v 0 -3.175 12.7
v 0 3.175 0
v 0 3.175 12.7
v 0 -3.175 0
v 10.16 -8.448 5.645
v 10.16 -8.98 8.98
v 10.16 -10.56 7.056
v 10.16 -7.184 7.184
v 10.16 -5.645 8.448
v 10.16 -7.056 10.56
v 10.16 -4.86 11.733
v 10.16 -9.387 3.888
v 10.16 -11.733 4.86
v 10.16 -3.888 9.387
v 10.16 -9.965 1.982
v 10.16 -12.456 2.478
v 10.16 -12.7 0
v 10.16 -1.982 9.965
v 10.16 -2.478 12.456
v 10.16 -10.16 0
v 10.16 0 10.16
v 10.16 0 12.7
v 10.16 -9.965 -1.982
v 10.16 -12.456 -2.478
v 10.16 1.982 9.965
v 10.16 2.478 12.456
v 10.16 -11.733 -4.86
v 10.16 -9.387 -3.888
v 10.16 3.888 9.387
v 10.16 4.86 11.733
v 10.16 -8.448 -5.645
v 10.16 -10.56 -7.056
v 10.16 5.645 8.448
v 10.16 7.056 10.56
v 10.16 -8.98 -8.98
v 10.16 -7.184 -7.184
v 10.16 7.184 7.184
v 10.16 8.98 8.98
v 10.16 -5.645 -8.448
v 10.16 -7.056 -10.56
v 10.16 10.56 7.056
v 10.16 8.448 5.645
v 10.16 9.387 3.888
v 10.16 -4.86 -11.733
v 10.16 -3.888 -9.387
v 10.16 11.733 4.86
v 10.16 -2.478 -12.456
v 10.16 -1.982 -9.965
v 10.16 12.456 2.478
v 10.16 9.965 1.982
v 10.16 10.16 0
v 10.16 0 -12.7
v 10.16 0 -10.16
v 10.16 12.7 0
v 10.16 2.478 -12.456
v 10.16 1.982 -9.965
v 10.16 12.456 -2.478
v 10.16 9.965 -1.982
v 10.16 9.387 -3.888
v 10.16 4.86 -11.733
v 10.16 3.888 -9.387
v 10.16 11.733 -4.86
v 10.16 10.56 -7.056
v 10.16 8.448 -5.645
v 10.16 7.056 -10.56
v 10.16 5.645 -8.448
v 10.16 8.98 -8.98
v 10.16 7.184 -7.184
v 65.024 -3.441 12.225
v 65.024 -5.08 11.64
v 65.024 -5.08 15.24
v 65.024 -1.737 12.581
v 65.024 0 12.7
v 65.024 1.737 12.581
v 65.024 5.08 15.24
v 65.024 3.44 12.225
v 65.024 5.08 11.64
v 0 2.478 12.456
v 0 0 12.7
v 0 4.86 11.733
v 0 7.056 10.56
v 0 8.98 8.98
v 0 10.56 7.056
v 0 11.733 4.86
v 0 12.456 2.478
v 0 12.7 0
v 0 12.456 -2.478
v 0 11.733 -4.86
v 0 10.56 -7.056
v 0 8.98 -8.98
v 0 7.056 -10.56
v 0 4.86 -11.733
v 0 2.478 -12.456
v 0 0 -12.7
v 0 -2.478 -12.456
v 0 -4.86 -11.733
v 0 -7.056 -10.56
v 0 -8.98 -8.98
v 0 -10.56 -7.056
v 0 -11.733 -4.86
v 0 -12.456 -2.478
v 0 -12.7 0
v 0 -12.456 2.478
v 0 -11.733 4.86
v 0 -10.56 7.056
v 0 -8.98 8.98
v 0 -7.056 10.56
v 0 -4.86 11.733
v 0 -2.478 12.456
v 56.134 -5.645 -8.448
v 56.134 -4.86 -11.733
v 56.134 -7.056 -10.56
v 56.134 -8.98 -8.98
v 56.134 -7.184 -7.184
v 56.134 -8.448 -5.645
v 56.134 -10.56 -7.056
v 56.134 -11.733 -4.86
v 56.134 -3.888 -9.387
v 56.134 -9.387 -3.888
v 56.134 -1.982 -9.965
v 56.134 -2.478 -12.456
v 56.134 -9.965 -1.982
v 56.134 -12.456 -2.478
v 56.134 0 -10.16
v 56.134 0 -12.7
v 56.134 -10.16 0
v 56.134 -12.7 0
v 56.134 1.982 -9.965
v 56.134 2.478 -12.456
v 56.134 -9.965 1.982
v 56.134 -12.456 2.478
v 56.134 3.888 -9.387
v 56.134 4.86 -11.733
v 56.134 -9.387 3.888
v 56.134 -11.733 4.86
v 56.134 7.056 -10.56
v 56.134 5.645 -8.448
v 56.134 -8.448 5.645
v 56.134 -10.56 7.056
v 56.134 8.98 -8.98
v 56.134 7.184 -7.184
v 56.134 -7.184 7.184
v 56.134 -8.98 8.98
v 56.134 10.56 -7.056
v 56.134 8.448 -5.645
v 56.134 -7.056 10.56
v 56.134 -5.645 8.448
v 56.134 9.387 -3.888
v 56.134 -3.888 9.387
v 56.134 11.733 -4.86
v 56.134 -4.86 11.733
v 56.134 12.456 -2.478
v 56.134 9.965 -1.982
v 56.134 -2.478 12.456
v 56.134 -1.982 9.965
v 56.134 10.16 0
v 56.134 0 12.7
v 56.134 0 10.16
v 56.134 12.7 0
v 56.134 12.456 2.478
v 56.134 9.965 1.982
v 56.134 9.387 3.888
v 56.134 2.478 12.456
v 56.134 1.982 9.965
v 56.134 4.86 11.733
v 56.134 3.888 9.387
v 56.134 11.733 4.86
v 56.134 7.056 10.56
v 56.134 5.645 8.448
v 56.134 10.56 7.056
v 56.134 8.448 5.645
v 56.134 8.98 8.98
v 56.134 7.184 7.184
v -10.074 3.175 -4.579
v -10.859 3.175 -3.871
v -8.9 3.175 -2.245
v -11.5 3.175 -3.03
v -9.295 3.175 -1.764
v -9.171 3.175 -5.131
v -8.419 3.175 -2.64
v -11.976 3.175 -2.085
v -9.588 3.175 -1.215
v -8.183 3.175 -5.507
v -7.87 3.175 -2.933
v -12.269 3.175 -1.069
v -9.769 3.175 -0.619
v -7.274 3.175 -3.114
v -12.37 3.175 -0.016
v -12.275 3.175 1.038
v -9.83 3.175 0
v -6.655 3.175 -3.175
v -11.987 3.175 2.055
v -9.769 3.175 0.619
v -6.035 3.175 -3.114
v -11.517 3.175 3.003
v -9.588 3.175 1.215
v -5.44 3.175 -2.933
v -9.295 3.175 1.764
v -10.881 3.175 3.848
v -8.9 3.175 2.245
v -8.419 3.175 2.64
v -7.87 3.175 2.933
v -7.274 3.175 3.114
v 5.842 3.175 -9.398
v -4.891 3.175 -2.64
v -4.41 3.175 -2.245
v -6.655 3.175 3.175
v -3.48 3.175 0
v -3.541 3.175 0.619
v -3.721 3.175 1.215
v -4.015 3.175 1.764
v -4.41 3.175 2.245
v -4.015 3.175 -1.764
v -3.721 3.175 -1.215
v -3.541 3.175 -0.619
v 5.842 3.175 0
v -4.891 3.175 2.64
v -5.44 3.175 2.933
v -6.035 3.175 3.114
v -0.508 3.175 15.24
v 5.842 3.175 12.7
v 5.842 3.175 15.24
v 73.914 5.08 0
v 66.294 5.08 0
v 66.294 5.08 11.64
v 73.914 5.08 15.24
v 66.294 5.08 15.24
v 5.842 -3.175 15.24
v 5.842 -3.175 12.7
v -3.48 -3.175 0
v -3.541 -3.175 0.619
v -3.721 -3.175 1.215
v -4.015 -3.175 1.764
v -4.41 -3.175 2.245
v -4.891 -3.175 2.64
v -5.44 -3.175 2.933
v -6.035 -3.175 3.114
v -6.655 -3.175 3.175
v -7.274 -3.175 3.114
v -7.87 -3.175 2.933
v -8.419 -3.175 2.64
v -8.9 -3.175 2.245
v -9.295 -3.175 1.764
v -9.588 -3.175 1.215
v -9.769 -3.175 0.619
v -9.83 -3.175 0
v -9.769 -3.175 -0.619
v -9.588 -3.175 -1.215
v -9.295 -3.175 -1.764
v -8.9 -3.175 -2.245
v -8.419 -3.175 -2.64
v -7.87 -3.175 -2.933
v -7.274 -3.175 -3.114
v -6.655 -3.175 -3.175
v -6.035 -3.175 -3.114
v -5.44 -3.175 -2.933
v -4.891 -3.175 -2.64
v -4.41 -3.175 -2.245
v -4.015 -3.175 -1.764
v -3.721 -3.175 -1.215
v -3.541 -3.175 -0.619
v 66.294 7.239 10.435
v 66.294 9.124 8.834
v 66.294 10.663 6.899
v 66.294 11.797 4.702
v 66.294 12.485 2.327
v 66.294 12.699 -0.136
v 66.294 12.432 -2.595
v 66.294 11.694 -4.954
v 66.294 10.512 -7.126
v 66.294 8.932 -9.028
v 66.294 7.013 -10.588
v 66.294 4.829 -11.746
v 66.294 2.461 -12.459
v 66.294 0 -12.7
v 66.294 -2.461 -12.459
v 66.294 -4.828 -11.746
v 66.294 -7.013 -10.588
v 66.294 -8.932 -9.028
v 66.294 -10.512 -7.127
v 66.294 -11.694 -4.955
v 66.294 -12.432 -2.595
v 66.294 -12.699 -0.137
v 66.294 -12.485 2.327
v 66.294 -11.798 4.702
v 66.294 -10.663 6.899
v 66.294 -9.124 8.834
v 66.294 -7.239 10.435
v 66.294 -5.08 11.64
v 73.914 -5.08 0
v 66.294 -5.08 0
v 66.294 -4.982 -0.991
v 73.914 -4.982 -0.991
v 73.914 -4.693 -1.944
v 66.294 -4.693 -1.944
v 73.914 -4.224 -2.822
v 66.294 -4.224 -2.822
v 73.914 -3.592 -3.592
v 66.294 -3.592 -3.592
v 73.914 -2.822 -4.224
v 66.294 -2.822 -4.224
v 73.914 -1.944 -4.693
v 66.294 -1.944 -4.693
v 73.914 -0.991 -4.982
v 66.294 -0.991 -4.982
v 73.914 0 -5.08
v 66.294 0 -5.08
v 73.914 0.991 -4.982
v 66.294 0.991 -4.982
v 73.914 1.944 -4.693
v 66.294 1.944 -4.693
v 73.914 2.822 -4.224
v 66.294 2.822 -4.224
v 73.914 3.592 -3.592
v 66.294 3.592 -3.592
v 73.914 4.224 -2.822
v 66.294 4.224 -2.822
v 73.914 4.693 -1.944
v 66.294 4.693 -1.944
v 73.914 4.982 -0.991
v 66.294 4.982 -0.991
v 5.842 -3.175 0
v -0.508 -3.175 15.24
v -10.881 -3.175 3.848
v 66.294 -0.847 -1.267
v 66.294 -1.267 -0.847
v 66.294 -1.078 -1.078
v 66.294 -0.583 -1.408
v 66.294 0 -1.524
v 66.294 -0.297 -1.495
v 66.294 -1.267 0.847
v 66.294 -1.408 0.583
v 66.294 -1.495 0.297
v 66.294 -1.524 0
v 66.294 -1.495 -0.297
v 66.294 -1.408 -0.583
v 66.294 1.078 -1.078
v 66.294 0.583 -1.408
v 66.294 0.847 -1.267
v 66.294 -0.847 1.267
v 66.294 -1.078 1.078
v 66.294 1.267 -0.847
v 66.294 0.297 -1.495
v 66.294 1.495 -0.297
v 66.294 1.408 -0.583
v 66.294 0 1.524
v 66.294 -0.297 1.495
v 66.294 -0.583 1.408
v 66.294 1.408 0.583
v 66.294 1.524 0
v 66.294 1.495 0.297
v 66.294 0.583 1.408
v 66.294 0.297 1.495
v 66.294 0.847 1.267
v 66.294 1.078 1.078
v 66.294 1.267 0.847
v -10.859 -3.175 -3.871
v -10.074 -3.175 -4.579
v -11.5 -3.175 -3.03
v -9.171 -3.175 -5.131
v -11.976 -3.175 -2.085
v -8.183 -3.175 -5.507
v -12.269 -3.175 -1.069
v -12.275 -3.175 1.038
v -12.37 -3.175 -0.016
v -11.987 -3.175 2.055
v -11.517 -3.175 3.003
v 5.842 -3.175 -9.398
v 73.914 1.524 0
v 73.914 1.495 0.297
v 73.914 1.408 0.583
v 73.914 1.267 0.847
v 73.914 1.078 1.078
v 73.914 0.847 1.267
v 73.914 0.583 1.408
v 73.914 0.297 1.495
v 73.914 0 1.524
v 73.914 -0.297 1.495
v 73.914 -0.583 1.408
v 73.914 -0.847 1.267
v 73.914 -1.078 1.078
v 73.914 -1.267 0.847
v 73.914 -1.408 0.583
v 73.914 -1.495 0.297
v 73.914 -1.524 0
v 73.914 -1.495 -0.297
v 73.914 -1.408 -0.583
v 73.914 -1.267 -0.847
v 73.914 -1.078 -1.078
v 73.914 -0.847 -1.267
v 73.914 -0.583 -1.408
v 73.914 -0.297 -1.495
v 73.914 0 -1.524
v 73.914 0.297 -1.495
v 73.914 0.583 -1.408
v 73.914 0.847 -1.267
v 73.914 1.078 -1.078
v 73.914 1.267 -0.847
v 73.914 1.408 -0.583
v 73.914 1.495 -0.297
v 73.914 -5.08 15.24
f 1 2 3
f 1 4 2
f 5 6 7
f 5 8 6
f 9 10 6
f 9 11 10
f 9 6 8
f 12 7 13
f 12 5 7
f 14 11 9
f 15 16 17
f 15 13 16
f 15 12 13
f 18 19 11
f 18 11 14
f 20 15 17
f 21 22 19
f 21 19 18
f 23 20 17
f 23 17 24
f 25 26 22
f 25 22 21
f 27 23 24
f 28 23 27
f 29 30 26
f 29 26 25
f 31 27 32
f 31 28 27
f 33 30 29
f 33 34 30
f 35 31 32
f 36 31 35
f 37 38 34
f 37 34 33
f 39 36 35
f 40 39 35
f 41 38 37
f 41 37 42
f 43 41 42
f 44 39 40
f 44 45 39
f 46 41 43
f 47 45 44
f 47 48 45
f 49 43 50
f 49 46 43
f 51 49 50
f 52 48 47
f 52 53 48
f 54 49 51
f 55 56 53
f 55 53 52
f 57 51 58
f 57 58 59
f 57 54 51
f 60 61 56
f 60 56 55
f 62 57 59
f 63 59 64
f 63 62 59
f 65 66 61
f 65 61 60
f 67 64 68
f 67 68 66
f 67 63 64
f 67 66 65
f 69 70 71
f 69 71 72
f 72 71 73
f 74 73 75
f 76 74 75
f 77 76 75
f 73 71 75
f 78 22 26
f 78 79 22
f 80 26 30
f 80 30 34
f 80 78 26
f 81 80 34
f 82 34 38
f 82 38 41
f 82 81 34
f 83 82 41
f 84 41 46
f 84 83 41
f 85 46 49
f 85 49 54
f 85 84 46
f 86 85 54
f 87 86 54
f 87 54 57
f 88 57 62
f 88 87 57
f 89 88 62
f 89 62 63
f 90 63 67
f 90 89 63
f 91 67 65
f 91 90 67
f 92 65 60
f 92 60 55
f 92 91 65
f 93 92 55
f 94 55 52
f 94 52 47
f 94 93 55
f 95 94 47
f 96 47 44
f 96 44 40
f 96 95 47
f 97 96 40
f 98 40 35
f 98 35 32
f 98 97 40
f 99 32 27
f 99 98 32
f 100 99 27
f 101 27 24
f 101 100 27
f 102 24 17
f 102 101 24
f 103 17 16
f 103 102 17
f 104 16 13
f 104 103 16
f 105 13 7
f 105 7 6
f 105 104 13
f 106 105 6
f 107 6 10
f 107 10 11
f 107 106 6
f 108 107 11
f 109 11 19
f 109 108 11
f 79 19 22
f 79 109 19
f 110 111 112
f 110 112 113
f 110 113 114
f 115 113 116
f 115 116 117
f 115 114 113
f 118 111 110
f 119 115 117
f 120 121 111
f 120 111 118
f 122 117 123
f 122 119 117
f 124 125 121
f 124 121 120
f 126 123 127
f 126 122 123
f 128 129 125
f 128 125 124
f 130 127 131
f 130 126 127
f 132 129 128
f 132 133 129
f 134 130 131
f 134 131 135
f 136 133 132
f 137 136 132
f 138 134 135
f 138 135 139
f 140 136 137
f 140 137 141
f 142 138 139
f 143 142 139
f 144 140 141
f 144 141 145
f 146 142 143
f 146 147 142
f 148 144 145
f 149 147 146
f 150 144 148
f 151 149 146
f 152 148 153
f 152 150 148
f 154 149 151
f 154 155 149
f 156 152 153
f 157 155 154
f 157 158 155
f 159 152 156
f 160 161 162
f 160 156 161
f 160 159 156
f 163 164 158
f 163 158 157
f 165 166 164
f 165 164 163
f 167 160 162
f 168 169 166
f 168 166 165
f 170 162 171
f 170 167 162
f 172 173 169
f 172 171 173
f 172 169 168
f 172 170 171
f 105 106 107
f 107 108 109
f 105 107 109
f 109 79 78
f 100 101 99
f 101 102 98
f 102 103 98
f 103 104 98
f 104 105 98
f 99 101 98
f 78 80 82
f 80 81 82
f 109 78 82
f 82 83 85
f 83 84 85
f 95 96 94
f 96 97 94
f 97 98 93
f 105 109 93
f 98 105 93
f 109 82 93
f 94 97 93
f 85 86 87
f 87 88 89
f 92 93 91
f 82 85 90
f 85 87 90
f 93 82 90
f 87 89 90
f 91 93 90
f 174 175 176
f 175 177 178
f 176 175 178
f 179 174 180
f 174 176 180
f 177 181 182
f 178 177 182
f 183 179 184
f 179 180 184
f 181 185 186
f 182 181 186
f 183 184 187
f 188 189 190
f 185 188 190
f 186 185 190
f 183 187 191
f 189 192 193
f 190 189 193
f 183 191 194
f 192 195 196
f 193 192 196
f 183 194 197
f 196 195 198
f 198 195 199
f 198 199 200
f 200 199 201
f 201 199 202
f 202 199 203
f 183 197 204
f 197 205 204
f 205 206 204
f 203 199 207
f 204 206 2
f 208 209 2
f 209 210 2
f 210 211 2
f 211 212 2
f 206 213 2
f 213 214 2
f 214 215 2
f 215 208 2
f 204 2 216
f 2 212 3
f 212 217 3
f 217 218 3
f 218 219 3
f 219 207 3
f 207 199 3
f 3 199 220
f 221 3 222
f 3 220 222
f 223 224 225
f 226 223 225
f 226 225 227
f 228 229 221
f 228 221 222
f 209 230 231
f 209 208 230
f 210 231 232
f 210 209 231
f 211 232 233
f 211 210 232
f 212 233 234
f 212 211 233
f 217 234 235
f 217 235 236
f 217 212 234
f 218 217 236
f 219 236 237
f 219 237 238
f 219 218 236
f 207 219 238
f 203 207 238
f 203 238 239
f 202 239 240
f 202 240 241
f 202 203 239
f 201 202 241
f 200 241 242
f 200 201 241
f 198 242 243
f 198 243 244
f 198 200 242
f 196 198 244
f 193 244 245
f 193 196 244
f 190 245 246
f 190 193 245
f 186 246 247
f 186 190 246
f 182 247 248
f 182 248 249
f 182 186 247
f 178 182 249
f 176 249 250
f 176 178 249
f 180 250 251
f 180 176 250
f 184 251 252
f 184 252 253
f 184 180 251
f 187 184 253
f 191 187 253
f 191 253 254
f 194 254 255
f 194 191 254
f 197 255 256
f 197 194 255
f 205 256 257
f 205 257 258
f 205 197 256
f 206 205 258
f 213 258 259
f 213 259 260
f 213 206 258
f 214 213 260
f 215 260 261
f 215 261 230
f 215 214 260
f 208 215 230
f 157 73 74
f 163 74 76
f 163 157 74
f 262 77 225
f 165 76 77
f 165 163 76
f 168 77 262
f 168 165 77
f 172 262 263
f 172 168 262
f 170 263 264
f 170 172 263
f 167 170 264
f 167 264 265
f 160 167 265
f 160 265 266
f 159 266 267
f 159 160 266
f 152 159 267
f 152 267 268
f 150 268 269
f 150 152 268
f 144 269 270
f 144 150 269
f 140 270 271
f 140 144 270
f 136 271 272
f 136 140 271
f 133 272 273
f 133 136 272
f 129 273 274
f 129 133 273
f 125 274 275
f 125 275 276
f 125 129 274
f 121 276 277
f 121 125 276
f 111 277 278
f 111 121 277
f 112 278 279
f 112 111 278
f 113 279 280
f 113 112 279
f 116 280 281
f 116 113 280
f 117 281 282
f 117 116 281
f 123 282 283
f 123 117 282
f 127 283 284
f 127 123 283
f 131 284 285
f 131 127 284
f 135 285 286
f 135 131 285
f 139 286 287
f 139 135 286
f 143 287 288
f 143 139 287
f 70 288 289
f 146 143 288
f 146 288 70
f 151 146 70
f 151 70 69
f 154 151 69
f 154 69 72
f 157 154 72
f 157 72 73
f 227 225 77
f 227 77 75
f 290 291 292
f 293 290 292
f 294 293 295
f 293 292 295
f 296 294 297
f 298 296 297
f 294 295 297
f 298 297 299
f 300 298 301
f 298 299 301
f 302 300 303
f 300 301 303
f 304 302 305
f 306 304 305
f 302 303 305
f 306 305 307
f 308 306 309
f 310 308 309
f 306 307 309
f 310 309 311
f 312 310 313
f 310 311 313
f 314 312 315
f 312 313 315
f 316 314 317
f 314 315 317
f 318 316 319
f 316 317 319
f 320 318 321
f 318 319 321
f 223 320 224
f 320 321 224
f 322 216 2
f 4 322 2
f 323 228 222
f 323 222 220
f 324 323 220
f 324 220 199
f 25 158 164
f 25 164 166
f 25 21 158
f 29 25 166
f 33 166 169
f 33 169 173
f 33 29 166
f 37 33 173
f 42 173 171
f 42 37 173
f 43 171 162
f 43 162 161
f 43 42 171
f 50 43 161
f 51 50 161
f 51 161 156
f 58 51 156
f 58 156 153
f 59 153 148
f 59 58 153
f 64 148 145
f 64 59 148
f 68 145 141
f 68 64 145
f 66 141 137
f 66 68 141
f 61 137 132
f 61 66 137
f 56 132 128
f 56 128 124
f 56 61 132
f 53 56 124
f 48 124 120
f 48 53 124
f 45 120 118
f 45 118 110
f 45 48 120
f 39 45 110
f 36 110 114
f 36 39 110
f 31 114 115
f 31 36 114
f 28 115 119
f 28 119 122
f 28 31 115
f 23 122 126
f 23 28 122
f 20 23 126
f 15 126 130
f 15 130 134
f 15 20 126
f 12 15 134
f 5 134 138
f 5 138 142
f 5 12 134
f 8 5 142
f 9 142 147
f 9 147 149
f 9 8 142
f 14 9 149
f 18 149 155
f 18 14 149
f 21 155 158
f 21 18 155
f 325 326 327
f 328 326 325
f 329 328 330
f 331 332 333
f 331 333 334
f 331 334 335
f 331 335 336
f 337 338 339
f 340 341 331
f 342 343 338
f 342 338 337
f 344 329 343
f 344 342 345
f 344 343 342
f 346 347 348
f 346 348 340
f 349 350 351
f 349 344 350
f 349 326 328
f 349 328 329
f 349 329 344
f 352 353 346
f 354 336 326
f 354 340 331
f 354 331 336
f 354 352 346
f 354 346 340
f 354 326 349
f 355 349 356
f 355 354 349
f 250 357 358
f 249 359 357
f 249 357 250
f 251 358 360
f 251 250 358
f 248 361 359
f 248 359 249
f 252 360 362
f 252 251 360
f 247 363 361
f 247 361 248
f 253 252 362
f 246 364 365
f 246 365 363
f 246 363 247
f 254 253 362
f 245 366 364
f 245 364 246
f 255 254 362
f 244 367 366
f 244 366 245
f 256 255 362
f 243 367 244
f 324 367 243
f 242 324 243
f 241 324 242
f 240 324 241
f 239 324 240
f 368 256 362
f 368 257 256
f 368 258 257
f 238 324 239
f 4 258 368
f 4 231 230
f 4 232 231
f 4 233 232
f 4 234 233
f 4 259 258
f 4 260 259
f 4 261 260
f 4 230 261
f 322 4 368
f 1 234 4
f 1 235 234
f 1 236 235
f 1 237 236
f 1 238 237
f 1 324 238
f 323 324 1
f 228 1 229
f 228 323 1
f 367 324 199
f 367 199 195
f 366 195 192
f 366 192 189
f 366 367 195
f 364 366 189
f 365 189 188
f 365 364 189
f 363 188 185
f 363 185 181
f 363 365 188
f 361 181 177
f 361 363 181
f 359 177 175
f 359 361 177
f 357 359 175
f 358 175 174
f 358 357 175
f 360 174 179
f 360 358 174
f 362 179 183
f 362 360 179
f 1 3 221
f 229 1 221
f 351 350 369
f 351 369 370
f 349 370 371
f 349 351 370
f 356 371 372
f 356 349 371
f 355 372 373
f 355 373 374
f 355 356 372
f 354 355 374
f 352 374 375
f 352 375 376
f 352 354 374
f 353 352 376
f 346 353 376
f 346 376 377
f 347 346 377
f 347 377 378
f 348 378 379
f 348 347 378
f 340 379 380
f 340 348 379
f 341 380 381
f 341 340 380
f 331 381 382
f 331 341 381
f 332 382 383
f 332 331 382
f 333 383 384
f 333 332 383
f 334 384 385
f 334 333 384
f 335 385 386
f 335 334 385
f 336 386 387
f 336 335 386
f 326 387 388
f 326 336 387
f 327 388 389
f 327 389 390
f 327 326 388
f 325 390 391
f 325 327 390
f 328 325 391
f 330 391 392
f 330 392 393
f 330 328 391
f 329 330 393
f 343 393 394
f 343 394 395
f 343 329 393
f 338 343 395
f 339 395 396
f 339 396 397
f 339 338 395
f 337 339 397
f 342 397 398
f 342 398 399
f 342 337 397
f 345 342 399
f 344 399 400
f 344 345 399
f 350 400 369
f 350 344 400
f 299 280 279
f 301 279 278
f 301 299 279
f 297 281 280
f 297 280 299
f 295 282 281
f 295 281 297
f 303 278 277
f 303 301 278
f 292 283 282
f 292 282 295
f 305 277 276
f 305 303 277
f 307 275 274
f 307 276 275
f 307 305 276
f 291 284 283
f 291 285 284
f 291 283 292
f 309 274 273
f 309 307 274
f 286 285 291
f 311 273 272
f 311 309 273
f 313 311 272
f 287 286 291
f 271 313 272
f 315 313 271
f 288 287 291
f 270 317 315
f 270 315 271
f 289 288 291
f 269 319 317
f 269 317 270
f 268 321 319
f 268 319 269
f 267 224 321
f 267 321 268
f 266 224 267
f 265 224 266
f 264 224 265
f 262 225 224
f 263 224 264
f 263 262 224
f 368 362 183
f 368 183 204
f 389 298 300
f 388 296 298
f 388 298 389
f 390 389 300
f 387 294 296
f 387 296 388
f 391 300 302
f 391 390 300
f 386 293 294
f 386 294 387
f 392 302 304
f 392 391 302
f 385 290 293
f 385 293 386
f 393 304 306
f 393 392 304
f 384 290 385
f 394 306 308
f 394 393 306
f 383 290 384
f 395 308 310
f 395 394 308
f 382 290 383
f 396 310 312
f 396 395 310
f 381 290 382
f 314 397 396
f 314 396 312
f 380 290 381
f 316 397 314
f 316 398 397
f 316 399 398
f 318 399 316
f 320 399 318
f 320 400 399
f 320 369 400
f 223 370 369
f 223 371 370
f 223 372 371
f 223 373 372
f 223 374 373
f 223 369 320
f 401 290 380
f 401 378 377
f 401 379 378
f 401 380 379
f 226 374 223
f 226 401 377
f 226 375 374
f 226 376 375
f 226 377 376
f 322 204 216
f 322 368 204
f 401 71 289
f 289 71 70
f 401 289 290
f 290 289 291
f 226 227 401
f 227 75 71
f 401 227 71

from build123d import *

# Parameters (mm, degrees)
F0_W     = 5.842
F0_H     = 12.7
F0_R     = 3.175
F2_DEPTH = 3.175
F4_DEPTH = 1.27
F3_R     = 1.524
F5_DEPTH = 7.62


with BuildPart() as f1:
    # F0 (on Front) → F1 (revolve)
    with BuildSketch(Plane.XZ):
        Polygon((5.842, 12.7), (5.842, 0), (66.294, 0), (66.294, 12.7), (56.134, 12.7), (56.134, 10.16), (10.16, 10.16), (10.16, 12.7), align=None)
        with Locations((2.921, 6.35)):
            Rectangle(F0_W, F0_H)
    revolve(axis=Axis((33.147, 0, 0), (-1, 0, 0)))

    # F3 (on face) → F4 (join)
    with BuildSketch(Plane.YZ.offset(66.294)):
        with BuildLine():
            ThreePointArc((-5.08, 11.639742), (-0.000107, 12.7), (5.079804, 11.639828))
            Line((5.079804, 11.639828), (5.079743, 15.24))
            Line((5.079743, 15.24), (-5.08, 15.24))
            Line((-5.08, 15.24), (-5.08, 11.639742))
        make_face()
    extrude(amount=-F4_DEPTH)

    # F3 (on face) → F5 (join)
    with BuildSketch(Plane.YZ.offset(66.294)):
        with BuildLine():
            ThreePointArc((-5.08, 0), (0, -5.08), (5.08, 0))
            ThreePointArc((5.08, 0), (0, 5.08), (-5.08, 0))
        make_face()
        Circle(F3_R, mode=Mode.SUBTRACT)
        with BuildLine():
            ThreePointArc((-5.08, 0), (0, 5.08), (5.08, 0))
            Line((5.08, 0), (5.079743, 15.24))
            Line((5.079743, 15.24), (-5.08, 15.24))
            Line((-5.08, 15.24), (-5.08, 0))
        make_face()
    extrude(amount=F5_DEPTH)


with BuildPart() as f2:
    # F0 (on Front) → F2 (new body, symmetric)
    with BuildSketch(Plane.XZ):
        with BuildLine():
            ThreePointArc((-8.182663, -5.506983), (-3.195791, -4.549339), (-0.9398, 0))
            ThreePointArc((-0.9398, 0), (-4.591961, 5.329721), (-10.88063, 3.847543))
            ThreePointArc((-10.88063, 3.847543), (-12.145978, -1.583727), (-8.182663, -5.506983))
        make_face()
        with Locations((-6.6548, 0)):
            Circle(F0_R, mode=Mode.SUBTRACT)
        with BuildLine():
            Line((-0.9398, 0), (0, 0))
            Line((0, 0), (0, 12.7))
            Line((0, 12.7), (5.842, 12.7))
            Line((5.842, 12.7), (5.842, 15.24))
            Line((5.842, 15.24), (-0.508, 15.24))
            Line((-0.508, 15.24), (-10.88063, 3.847543))
            ThreePointArc((-10.88063, 3.847543), (-4.591961, 5.329721), (-0.9398, 0))
        make_face()
        with BuildLine():
            Line((5.842, 0), (0, 0))
            Line((0, 0), (-0.9398, 0))
            ThreePointArc((-0.9398, 0), (-3.195791, -4.549339), (-8.182663, -5.506983))
            Line((-8.182663, -5.506983), (5.842, -9.398))
            Line((5.842, -9.398), (5.842, 0))
        make_face()
    extrude(amount=F2_DEPTH, both=True)


solid = Compound([f1.part, f2.part])
